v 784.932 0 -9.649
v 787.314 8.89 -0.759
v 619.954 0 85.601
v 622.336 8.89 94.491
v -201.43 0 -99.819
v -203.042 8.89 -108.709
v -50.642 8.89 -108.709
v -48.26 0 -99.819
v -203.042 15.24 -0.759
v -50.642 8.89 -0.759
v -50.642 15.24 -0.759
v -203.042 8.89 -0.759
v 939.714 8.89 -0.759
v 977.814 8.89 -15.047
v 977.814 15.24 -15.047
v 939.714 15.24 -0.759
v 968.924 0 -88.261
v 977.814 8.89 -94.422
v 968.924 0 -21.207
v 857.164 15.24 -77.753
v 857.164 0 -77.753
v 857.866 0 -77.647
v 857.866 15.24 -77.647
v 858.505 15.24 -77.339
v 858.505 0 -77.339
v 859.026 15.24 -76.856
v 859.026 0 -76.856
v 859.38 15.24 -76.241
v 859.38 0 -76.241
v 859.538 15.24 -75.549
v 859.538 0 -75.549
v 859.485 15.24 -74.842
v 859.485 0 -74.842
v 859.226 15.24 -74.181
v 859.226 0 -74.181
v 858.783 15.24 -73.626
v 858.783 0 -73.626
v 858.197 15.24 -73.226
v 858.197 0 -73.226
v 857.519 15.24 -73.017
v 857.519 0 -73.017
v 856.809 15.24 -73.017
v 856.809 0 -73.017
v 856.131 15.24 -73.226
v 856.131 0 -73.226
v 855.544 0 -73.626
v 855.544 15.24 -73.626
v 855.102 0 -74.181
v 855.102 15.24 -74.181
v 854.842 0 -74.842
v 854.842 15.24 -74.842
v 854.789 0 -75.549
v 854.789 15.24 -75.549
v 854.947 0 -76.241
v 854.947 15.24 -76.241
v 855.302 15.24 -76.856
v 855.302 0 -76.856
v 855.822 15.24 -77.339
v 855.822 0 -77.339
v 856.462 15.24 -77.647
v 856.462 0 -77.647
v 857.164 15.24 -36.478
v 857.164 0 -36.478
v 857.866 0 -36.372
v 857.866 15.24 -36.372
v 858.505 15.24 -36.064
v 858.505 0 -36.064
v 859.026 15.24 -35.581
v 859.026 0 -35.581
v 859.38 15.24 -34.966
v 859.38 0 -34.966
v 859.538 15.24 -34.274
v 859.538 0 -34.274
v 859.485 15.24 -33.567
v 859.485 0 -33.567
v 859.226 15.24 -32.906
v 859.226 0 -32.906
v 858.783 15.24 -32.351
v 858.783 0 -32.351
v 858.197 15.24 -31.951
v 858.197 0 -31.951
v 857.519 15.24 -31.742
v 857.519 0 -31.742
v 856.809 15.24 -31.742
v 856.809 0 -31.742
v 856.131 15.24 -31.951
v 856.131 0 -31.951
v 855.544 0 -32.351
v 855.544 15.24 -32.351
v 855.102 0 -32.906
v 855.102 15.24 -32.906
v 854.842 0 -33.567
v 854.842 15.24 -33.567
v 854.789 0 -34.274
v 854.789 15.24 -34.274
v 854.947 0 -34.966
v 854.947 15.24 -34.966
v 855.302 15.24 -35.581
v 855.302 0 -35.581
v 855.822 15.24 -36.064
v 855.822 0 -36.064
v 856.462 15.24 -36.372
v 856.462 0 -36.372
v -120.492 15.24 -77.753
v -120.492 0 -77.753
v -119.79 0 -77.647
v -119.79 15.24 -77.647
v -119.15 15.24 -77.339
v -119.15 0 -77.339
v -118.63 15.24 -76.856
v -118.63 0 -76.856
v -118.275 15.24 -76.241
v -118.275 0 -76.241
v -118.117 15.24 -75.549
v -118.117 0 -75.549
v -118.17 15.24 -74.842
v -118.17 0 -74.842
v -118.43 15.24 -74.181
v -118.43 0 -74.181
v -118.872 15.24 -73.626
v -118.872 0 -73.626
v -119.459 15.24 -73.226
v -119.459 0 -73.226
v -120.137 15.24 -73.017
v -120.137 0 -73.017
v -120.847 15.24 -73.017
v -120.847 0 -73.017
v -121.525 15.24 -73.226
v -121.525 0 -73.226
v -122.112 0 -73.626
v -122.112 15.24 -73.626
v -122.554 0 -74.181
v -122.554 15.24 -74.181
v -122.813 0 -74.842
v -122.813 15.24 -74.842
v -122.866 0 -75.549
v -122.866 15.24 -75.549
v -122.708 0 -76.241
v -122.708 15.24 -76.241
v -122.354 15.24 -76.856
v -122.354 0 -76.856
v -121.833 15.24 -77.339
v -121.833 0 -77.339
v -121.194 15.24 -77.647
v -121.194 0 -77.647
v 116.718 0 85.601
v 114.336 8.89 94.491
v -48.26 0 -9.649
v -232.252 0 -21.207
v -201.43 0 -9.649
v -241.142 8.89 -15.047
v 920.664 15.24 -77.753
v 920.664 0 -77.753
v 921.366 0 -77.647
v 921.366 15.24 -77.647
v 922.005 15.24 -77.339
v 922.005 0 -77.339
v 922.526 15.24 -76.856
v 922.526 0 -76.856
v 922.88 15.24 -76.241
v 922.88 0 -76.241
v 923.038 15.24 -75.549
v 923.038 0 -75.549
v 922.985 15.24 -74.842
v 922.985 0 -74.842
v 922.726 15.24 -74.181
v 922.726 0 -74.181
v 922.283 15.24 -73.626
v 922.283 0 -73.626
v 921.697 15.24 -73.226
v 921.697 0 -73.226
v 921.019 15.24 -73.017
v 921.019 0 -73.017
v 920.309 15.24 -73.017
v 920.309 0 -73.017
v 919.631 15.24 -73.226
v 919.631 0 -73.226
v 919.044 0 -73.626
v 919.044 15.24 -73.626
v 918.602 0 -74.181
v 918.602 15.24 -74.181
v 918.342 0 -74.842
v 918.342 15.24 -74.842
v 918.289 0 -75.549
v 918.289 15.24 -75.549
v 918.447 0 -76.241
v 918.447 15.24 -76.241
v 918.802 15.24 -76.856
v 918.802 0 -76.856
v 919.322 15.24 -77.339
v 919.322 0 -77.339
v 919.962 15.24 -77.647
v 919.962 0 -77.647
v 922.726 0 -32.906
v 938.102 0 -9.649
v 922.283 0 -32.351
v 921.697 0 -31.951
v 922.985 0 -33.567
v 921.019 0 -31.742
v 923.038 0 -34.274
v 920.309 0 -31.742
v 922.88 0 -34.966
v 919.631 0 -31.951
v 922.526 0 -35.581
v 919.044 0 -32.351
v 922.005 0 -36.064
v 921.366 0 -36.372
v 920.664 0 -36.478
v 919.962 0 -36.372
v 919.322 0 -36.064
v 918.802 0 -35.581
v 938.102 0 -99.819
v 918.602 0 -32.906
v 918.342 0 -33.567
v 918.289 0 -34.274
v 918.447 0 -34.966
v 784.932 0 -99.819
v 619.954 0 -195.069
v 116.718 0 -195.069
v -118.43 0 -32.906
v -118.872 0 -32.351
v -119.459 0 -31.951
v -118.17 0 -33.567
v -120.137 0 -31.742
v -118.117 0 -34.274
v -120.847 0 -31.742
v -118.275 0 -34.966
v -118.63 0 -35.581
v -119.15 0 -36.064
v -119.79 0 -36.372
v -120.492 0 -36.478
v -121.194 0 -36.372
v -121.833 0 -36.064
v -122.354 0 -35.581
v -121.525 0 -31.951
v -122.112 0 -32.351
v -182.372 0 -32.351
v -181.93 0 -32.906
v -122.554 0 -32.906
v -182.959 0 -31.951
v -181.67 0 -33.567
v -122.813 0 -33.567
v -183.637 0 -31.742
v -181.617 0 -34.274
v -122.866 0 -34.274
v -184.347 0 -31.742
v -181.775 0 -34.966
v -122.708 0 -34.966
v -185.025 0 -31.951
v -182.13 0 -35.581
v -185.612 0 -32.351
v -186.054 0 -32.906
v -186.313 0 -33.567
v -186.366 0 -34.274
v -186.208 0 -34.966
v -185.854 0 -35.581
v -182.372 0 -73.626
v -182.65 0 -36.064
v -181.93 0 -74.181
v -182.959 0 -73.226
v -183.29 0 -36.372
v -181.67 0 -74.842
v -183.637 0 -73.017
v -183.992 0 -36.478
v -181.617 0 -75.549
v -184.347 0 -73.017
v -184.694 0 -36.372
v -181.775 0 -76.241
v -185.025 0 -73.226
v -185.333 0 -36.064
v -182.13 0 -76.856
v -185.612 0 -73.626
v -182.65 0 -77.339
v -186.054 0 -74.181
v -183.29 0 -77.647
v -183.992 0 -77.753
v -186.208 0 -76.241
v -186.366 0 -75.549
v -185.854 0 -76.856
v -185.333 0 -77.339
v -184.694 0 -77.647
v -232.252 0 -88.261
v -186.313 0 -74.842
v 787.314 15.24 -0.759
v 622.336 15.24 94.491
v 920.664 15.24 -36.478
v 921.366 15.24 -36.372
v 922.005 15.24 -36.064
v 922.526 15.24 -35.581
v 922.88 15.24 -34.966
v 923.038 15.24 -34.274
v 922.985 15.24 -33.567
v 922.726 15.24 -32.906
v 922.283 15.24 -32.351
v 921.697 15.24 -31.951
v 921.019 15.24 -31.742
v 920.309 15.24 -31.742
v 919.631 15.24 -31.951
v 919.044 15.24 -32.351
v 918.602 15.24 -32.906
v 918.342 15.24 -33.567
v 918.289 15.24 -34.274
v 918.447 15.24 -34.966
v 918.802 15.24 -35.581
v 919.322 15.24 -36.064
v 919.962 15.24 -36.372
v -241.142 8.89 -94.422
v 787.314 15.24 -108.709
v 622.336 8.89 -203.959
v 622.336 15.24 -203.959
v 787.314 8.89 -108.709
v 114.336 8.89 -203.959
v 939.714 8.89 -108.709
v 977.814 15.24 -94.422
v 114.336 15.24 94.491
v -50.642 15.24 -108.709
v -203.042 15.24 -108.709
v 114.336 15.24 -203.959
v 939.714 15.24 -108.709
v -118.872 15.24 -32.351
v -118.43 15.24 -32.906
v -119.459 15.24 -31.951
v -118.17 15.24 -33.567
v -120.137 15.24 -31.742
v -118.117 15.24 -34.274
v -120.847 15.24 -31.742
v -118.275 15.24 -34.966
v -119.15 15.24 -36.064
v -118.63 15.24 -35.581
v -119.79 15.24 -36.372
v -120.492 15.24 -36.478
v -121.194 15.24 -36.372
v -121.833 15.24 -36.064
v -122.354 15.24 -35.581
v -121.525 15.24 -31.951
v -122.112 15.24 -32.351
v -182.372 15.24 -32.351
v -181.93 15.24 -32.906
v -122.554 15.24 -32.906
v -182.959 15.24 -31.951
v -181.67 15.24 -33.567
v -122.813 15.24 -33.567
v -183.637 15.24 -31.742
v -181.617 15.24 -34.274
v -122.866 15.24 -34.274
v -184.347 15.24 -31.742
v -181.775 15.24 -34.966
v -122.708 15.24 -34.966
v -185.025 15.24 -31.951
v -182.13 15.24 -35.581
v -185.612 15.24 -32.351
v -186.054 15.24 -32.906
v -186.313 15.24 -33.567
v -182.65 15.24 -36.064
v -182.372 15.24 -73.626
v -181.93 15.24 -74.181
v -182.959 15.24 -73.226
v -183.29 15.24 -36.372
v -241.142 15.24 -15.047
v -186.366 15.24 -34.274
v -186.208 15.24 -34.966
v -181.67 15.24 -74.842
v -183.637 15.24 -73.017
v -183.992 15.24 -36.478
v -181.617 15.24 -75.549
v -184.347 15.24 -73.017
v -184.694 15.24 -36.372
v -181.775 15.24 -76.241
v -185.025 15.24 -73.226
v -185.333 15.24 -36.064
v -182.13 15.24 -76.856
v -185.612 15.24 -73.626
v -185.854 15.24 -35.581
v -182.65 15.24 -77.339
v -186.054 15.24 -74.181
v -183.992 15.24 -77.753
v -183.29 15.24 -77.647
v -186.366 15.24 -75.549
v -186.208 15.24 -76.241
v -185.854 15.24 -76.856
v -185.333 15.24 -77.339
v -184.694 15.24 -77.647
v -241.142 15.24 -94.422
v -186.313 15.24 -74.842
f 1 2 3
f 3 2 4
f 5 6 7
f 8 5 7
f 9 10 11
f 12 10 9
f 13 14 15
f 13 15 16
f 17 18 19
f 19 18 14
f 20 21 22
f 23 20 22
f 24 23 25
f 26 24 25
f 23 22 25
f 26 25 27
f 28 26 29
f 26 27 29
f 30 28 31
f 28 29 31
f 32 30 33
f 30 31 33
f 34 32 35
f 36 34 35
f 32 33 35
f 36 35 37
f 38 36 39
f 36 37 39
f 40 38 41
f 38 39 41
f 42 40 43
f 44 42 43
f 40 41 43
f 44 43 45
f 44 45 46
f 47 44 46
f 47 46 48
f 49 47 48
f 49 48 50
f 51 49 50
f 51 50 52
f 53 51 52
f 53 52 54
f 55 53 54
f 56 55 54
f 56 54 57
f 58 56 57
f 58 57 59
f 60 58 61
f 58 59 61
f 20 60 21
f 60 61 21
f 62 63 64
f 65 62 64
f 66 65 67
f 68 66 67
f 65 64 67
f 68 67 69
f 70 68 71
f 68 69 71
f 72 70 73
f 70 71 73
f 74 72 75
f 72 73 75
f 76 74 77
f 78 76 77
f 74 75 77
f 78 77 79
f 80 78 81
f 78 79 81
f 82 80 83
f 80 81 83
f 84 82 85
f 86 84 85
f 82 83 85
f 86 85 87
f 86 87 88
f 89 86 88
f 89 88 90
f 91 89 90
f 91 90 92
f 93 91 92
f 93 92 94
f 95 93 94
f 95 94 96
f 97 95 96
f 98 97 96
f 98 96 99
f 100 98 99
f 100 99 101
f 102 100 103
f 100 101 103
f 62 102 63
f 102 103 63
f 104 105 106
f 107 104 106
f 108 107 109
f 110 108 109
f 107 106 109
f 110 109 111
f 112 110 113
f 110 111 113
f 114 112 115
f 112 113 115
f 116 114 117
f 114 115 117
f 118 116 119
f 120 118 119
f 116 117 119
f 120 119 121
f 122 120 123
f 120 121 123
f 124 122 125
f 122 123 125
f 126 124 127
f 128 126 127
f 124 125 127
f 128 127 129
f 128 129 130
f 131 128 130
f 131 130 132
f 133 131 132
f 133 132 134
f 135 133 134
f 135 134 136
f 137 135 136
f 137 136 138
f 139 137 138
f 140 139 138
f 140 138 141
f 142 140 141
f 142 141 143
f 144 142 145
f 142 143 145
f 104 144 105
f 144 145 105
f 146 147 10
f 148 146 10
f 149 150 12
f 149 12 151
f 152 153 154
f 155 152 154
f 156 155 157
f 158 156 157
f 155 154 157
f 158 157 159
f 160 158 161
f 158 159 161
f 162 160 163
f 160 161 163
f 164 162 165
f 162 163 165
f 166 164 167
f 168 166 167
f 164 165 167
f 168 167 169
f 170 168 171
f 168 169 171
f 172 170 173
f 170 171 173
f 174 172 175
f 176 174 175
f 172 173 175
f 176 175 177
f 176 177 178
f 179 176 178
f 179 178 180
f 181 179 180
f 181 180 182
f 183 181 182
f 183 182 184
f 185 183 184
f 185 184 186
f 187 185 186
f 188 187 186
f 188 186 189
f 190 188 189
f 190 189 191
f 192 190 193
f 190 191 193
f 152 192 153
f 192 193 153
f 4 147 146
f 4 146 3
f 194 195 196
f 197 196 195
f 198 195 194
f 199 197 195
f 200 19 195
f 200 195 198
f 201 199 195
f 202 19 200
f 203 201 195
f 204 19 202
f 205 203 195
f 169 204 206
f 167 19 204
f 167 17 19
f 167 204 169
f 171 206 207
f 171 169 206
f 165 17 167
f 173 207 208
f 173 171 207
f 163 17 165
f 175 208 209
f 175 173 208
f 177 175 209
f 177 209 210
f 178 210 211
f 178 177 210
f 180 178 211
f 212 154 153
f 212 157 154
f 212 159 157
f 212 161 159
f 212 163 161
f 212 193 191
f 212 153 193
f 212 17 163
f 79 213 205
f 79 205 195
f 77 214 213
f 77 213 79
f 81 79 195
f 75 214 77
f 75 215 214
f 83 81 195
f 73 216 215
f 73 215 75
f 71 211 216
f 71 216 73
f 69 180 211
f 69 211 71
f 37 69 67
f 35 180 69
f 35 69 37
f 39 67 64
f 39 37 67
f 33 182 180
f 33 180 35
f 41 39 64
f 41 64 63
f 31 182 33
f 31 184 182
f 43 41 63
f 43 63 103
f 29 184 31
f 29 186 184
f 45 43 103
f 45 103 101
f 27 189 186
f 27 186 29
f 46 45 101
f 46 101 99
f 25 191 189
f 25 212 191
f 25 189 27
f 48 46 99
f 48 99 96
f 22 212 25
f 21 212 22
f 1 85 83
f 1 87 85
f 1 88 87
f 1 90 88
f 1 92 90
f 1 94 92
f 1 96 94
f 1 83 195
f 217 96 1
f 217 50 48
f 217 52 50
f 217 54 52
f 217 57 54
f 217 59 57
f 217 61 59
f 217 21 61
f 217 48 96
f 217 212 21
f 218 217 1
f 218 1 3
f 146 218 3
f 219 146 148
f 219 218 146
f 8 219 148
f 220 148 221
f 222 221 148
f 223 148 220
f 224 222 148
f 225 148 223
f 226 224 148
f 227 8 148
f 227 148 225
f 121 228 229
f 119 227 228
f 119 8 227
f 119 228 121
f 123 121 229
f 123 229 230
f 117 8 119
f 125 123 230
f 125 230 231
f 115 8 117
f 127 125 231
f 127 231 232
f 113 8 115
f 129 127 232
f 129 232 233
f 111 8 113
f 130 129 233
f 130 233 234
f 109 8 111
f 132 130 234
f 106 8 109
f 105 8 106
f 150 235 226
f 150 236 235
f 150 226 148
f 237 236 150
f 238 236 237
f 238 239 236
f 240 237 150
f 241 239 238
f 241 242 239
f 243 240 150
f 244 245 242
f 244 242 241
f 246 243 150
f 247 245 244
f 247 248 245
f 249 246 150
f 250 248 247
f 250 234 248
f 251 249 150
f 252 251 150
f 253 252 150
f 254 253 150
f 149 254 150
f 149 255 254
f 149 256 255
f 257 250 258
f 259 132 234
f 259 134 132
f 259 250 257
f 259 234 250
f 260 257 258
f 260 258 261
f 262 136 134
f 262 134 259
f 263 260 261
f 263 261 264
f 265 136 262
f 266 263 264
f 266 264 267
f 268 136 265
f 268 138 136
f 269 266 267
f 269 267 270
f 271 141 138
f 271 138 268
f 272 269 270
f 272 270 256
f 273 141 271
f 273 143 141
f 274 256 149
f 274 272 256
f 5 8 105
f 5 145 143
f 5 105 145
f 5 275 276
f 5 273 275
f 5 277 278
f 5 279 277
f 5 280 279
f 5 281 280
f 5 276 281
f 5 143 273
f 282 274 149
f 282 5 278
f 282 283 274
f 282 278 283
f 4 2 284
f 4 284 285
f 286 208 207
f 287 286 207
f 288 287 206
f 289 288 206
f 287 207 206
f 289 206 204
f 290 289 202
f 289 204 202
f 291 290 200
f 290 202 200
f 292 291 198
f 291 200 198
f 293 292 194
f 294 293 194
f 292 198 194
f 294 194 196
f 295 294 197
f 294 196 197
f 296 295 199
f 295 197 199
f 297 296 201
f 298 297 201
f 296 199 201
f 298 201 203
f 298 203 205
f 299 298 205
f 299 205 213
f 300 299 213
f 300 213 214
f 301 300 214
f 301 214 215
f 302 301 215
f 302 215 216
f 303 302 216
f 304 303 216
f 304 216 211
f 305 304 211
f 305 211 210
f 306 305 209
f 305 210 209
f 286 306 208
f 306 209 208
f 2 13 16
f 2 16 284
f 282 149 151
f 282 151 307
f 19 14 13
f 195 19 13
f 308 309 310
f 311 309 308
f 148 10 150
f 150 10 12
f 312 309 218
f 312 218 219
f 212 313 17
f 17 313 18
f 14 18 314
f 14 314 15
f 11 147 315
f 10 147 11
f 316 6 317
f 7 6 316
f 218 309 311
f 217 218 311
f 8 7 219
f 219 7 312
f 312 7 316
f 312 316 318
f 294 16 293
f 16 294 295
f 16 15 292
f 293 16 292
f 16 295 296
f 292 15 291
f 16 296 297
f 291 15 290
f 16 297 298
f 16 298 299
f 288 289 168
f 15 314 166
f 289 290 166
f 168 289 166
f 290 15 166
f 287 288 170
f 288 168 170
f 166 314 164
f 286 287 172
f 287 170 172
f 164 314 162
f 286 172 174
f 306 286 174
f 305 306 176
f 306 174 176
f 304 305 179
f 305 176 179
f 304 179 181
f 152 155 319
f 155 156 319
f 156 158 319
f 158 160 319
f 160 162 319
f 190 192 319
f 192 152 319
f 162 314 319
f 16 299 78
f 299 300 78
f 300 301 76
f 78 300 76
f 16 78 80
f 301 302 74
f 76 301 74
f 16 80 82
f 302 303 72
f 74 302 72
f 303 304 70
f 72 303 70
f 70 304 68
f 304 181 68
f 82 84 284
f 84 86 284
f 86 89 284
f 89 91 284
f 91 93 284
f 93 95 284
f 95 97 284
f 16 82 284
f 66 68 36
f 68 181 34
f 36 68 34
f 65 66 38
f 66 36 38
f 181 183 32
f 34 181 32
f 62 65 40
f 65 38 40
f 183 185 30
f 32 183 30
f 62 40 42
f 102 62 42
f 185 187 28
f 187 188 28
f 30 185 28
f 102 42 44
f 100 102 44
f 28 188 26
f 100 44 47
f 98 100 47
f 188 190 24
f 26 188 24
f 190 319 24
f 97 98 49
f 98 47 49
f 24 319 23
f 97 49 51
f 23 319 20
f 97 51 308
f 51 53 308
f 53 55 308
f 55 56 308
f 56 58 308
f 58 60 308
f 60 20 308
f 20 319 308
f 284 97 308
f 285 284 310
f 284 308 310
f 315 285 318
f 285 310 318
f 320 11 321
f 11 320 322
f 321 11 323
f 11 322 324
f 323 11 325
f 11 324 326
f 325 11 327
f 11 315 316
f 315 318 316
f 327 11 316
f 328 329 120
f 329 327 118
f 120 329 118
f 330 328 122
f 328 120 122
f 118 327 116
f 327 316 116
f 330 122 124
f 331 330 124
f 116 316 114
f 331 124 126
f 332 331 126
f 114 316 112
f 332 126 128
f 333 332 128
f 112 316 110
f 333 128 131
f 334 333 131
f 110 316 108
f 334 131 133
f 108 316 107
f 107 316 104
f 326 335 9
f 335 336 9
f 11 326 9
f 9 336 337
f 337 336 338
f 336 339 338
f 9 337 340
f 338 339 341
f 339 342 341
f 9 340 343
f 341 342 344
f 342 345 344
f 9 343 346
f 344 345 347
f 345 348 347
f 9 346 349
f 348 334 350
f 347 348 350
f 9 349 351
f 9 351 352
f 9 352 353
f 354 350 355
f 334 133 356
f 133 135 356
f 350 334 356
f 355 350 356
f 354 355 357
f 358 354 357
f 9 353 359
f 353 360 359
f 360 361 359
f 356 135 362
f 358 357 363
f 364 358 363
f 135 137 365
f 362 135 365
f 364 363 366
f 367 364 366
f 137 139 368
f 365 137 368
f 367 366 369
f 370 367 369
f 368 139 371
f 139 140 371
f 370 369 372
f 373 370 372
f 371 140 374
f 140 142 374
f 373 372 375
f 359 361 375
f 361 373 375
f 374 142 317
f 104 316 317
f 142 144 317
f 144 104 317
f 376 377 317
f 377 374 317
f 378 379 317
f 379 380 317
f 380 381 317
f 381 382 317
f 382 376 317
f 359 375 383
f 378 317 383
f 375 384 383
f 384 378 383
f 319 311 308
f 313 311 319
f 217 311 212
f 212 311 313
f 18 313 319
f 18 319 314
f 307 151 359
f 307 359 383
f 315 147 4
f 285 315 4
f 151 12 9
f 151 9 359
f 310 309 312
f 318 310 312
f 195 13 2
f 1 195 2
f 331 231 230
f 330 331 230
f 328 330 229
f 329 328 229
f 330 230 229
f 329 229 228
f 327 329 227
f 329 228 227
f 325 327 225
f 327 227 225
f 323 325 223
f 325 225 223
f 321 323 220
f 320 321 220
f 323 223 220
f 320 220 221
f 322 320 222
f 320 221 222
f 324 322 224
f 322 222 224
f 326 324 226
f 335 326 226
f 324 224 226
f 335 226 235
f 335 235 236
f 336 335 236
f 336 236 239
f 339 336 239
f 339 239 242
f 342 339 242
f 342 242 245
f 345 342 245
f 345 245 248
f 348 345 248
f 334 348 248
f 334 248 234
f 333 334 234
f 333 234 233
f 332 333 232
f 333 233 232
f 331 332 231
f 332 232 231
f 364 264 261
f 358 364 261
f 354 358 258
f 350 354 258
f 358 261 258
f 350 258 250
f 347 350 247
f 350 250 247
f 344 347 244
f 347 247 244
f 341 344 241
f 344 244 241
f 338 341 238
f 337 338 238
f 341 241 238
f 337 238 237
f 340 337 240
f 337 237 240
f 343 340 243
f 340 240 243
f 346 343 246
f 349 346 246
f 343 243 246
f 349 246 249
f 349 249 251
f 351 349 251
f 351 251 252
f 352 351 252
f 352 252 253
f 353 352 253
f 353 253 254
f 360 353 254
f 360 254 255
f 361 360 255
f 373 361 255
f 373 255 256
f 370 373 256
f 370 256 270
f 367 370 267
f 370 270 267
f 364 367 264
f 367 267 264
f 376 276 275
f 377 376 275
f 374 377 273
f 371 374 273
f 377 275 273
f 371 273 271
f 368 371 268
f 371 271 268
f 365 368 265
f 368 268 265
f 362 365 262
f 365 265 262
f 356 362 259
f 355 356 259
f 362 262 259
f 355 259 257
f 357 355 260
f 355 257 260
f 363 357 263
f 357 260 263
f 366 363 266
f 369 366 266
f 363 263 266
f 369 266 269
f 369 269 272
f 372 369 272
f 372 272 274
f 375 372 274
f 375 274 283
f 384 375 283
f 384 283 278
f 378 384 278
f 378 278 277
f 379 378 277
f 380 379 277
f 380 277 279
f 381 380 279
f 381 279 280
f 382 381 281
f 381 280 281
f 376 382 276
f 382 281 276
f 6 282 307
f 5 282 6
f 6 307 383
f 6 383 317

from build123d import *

# Parameters (mm, degrees)
BOSS_EXTRUDE1_DEPTH = 15.24
SKETCH2_R           = 2.38125
CUT_EXTRUDE1_DEPTH  = 15.24
CHAMFER1_SIZE       = 8.89


with BuildPart() as part:
    # Sketch1 → Boss-Extrude1 (new body)
    with BuildSketch(Plane(origin=(0, 0, 0), x_dir=(1, 0, 0), z_dir=(0, 1, 0))):
        Polygon((-241.141854356, 15.046517442), (-241.141854356, 94.421517442), (-203.041854356, 108.709017442), (-50.641854356, 108.709017442), (114.335985065, 203.959017442), (368.335985065, 203.959017442), (622.335985065, 203.959017442), (787.313824486, 108.709017442), (939.713824486, 108.709017442), (977.813824486, 94.421517442), (977.813824486, 15.046517442), (939.713824486, 0.759017442), (787.313824486, 0.759017442), (622.335985065, -94.490982558), (368.335985065, -94.490982558), (114.335985065, -94.490982558), (-50.641854356, 0.759017442), (-203.041854356, 0.759017442), align=None)
    extrude(amount=BOSS_EXTRUDE1_DEPTH)

    # Sketch2 → Cut-Extrude1 (cut)
    with BuildSketch(Plane(origin=(0, 0, 0), x_dir=(-1, 0, 0), z_dir=(0, -1, 0))):
        with Locations(Location((183.991854356, 34.096517442, 0), (0, 0, 90))):
            Circle(SKETCH2_R)
        with Locations(Location((183.991854356, 75.371517443, 0), (0, 0, 90))):
            Circle(SKETCH2_R)
        with Locations(Location((120.491854356, 75.371517443, 0), (0, 0, 90))):
            Circle(SKETCH2_R)
        with Locations(Location((120.491854356, 34.096517443, 0), (0, 0, 90))):
            Circle(SKETCH2_R)
        with Locations(Location((-857.163824486, 75.371517443, 0), (0, 0, 90))):
            Circle(SKETCH2_R)
        with Locations(Location((-920.663824486, 75.371517443, 0), (0, 0, 90))):
            Circle(SKETCH2_R)
        with Locations(Location((-920.663824486, 34.096517442, 0), (0, 0, 90))):
            Circle(SKETCH2_R)
        with Locations(Location((-857.163824486, 34.096517443, 0), (0, 0, 90))):
            Circle(SKETCH2_R)
    extrude(amount=-CUT_EXTRUDE1_DEPTH, mode=Mode.SUBTRACT)

    # Chamfer1
    chamfer1_edges = [part.edges().sort_by_distance(p)[0] for p in [
        (-126.841854356, 0, -0.759017442),
        (-222.091854356, 0, -7.902767442),
        (-241.141854356, 0, -54.734017442),
        (-222.091854356, 0, -101.565267442),
        (-126.841854356, 0, -108.709017442),
        (31.847065354, 0, -156.334017442),
        (368.335985065, 0, -203.959017442),
        (704.824904775, 0, -156.334017442),
        (863.513824486, 0, -108.709017442),
        (958.763824486, 0, -101.565267442),
        (977.813824486, 0, -54.734017442),
        (958.763824486, 0, -7.902767442),
        (863.513824486, 0, -0.759017442),
        (704.824904775, 0, 46.865982558),
        (368.335985065, 0, 94.490982558),
        (31.847065354, 0, 46.865982558),
    ]]
    chamfer(chamfer1_edges, length=CHAMFER1_SIZE)


solid = part.part
